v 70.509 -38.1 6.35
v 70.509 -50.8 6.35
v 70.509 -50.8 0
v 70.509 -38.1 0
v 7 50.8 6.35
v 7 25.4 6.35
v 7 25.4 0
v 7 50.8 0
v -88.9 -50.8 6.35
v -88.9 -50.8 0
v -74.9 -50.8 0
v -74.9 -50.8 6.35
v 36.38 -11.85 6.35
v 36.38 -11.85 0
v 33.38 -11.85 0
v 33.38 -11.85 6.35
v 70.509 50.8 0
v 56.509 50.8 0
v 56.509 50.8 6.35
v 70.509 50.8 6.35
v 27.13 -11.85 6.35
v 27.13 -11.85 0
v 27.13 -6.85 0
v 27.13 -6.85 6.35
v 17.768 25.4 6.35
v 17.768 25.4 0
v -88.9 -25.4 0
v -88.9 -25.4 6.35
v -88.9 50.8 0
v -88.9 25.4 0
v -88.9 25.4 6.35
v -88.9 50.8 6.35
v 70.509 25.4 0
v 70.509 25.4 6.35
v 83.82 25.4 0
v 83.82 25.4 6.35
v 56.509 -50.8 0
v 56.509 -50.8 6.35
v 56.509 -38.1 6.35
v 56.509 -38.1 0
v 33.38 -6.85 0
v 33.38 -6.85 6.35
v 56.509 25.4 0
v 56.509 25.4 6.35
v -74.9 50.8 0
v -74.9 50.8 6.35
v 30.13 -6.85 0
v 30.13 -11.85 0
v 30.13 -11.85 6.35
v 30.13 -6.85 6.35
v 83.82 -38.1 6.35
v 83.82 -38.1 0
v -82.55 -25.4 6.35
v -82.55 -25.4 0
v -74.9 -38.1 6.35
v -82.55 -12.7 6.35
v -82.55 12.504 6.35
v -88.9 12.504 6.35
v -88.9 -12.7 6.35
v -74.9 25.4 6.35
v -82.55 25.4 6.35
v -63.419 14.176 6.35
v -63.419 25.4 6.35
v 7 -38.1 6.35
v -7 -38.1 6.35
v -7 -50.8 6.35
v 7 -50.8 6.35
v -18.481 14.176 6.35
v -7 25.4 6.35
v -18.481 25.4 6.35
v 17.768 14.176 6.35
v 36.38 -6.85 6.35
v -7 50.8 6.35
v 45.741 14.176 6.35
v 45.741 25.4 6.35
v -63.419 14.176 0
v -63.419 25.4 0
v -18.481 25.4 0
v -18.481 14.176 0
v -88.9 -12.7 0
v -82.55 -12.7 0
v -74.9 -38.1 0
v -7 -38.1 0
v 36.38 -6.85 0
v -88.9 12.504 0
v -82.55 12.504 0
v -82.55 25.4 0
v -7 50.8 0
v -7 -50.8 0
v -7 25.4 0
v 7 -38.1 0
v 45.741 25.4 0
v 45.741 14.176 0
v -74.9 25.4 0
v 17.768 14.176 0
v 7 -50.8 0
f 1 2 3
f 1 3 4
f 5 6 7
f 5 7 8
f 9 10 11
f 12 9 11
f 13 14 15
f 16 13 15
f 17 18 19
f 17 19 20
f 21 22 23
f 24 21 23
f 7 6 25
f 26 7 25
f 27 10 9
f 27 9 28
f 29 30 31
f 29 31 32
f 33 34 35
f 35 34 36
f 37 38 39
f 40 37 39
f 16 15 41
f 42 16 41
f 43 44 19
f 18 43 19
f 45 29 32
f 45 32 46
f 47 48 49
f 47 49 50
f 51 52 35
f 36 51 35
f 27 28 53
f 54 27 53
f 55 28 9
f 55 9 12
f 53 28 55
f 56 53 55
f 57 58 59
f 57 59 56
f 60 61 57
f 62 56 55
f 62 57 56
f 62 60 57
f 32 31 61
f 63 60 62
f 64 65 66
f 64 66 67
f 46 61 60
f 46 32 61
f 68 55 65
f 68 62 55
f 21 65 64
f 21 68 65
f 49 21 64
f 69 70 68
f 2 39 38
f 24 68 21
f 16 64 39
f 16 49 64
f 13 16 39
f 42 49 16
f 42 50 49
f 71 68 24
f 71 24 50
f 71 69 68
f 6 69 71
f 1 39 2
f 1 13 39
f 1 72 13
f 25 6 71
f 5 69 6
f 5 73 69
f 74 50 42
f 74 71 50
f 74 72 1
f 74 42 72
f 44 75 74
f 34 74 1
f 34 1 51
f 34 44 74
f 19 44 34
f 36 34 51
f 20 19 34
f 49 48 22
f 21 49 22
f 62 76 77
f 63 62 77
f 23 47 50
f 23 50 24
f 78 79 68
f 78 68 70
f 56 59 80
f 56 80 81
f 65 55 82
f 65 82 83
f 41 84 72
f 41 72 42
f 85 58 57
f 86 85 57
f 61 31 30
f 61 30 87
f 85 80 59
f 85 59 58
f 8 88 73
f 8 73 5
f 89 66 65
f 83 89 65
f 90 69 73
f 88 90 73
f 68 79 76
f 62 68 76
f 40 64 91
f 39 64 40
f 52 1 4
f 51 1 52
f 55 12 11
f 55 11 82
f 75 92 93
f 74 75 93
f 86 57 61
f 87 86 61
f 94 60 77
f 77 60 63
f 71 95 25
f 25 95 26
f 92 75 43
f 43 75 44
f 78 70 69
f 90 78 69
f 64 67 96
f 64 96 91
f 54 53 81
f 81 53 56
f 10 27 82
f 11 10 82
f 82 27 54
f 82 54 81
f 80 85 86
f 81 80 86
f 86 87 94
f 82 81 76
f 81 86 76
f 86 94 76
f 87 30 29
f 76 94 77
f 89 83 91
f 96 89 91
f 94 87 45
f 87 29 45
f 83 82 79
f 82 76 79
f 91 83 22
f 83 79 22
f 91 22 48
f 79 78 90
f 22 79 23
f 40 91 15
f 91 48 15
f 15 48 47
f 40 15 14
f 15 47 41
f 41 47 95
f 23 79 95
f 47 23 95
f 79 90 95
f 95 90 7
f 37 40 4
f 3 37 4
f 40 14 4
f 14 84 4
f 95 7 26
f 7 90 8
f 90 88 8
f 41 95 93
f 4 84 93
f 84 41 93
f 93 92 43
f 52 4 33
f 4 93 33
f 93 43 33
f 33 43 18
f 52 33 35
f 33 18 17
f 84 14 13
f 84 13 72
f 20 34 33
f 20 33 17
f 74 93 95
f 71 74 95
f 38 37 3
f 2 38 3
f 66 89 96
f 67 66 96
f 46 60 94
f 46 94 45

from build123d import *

# Parameters (mm, degrees)
SKETCH2_W           = 177.8
SKETCH2_H           = 101.6
BOSS_EXTRUDE3_DEPTH = 6.35
SKETCH3_W           = 6.35
SKETCH3_H           = 12.895827841
SKETCH3_W_2         = 67.9
SKETCH3_H_2         = 25.4
SKETCH3_H_3         = 12.7
SKETCH3_W_3         = 49.509
SKETCH3_W_4         = 18.391
CUT_EXTRUDE3_DEPTH  = 103.587389576
SKETCH4_W           = 44.937577928
SKETCH4_H           = 11.22448853
SKETCH4_W_2         = 5.08
SKETCH4_H_2         = 63.5
CUT_EXTRUDE4_DEPTH  = 103.587389576
SKETCH5_W           = 3
SKETCH5_H           = 5
CUT_EXTRUDE5_DEPTH  = 103.587389576


with BuildPart() as part:
    # Sketch2 → Boss-Extrude3 (new body)
    with BuildSketch(Plane.XY):
        Rectangle(SKETCH2_W, SKETCH2_H)
    extrude(amount=BOSS_EXTRUDE3_DEPTH)

    # Sketch3 → Cut-Extrude3 (cut, through all)
    with BuildSketch(Plane.XY.offset(6.35)):
        with Locations((-85.725, 18.95208608)):
            Rectangle(SKETCH3_W, SKETCH3_H)
        with Locations((-40.95, 38.1)):
            Rectangle(SKETCH3_W_2, SKETCH3_H_2)
        with Locations((-85.725, -19.05)):
            Rectangle(SKETCH3_W, SKETCH3_H_3)
        with Locations((31.7545, 38.1)):
            Rectangle(SKETCH3_W_3, SKETCH3_H_2)
        with Locations((79.7045, 38.1)):
            Rectangle(SKETCH3_W_4, SKETCH3_H_2)
        with Locations((-40.95, -44.45)):
            Rectangle(SKETCH3_W_2, SKETCH3_H_3)
        with Locations((31.7545, -44.45)):
            Rectangle(SKETCH3_W_3, SKETCH3_H_3)
        with Locations((79.7045, -44.45)):
            Rectangle(SKETCH3_W_4, SKETCH3_H_3)
    extrude(amount=-CUT_EXTRUDE3_DEPTH, mode=Mode.SUBTRACT)

    # Sketch4 → Cut-Extrude4 (cut, through all)
    with BuildSketch(Plane(origin=(0, 0, 0), x_dir=(-1, 0, 0), z_dir=(0, 0, -1))):
        with Locations((40.95, 19.787755735)):
            Rectangle(SKETCH4_W, SKETCH4_H)
        with Locations((-86.36, -6.35)):
            Rectangle(SKETCH4_W_2, SKETCH4_H_2)
        Polygon((-17.768385345, 25.4), (-31.7545, 25.4), (-45.740614655, 25.4), (-45.740614655, 14.176), (-17.768385345, 14.176), align=None)
    extrude(amount=-CUT_EXTRUDE4_DEPTH, mode=Mode.SUBTRACT)

    # Sketch5 → Cut-Extrude5 (cut, through all)
    with BuildSketch(Plane(origin=(0, 0, 0), x_dir=(-1, 0, 0), z_dir=(0, 0, -1))):
        with Locations((-28.6295, -9.35)):
            Rectangle(SKETCH5_W, SKETCH5_H)
        with Locations((-34.8795, -9.35)):
            Rectangle(SKETCH5_W, SKETCH5_H)
    extrude(amount=-CUT_EXTRUDE5_DEPTH, mode=Mode.SUBTRACT)


solid = part.part
